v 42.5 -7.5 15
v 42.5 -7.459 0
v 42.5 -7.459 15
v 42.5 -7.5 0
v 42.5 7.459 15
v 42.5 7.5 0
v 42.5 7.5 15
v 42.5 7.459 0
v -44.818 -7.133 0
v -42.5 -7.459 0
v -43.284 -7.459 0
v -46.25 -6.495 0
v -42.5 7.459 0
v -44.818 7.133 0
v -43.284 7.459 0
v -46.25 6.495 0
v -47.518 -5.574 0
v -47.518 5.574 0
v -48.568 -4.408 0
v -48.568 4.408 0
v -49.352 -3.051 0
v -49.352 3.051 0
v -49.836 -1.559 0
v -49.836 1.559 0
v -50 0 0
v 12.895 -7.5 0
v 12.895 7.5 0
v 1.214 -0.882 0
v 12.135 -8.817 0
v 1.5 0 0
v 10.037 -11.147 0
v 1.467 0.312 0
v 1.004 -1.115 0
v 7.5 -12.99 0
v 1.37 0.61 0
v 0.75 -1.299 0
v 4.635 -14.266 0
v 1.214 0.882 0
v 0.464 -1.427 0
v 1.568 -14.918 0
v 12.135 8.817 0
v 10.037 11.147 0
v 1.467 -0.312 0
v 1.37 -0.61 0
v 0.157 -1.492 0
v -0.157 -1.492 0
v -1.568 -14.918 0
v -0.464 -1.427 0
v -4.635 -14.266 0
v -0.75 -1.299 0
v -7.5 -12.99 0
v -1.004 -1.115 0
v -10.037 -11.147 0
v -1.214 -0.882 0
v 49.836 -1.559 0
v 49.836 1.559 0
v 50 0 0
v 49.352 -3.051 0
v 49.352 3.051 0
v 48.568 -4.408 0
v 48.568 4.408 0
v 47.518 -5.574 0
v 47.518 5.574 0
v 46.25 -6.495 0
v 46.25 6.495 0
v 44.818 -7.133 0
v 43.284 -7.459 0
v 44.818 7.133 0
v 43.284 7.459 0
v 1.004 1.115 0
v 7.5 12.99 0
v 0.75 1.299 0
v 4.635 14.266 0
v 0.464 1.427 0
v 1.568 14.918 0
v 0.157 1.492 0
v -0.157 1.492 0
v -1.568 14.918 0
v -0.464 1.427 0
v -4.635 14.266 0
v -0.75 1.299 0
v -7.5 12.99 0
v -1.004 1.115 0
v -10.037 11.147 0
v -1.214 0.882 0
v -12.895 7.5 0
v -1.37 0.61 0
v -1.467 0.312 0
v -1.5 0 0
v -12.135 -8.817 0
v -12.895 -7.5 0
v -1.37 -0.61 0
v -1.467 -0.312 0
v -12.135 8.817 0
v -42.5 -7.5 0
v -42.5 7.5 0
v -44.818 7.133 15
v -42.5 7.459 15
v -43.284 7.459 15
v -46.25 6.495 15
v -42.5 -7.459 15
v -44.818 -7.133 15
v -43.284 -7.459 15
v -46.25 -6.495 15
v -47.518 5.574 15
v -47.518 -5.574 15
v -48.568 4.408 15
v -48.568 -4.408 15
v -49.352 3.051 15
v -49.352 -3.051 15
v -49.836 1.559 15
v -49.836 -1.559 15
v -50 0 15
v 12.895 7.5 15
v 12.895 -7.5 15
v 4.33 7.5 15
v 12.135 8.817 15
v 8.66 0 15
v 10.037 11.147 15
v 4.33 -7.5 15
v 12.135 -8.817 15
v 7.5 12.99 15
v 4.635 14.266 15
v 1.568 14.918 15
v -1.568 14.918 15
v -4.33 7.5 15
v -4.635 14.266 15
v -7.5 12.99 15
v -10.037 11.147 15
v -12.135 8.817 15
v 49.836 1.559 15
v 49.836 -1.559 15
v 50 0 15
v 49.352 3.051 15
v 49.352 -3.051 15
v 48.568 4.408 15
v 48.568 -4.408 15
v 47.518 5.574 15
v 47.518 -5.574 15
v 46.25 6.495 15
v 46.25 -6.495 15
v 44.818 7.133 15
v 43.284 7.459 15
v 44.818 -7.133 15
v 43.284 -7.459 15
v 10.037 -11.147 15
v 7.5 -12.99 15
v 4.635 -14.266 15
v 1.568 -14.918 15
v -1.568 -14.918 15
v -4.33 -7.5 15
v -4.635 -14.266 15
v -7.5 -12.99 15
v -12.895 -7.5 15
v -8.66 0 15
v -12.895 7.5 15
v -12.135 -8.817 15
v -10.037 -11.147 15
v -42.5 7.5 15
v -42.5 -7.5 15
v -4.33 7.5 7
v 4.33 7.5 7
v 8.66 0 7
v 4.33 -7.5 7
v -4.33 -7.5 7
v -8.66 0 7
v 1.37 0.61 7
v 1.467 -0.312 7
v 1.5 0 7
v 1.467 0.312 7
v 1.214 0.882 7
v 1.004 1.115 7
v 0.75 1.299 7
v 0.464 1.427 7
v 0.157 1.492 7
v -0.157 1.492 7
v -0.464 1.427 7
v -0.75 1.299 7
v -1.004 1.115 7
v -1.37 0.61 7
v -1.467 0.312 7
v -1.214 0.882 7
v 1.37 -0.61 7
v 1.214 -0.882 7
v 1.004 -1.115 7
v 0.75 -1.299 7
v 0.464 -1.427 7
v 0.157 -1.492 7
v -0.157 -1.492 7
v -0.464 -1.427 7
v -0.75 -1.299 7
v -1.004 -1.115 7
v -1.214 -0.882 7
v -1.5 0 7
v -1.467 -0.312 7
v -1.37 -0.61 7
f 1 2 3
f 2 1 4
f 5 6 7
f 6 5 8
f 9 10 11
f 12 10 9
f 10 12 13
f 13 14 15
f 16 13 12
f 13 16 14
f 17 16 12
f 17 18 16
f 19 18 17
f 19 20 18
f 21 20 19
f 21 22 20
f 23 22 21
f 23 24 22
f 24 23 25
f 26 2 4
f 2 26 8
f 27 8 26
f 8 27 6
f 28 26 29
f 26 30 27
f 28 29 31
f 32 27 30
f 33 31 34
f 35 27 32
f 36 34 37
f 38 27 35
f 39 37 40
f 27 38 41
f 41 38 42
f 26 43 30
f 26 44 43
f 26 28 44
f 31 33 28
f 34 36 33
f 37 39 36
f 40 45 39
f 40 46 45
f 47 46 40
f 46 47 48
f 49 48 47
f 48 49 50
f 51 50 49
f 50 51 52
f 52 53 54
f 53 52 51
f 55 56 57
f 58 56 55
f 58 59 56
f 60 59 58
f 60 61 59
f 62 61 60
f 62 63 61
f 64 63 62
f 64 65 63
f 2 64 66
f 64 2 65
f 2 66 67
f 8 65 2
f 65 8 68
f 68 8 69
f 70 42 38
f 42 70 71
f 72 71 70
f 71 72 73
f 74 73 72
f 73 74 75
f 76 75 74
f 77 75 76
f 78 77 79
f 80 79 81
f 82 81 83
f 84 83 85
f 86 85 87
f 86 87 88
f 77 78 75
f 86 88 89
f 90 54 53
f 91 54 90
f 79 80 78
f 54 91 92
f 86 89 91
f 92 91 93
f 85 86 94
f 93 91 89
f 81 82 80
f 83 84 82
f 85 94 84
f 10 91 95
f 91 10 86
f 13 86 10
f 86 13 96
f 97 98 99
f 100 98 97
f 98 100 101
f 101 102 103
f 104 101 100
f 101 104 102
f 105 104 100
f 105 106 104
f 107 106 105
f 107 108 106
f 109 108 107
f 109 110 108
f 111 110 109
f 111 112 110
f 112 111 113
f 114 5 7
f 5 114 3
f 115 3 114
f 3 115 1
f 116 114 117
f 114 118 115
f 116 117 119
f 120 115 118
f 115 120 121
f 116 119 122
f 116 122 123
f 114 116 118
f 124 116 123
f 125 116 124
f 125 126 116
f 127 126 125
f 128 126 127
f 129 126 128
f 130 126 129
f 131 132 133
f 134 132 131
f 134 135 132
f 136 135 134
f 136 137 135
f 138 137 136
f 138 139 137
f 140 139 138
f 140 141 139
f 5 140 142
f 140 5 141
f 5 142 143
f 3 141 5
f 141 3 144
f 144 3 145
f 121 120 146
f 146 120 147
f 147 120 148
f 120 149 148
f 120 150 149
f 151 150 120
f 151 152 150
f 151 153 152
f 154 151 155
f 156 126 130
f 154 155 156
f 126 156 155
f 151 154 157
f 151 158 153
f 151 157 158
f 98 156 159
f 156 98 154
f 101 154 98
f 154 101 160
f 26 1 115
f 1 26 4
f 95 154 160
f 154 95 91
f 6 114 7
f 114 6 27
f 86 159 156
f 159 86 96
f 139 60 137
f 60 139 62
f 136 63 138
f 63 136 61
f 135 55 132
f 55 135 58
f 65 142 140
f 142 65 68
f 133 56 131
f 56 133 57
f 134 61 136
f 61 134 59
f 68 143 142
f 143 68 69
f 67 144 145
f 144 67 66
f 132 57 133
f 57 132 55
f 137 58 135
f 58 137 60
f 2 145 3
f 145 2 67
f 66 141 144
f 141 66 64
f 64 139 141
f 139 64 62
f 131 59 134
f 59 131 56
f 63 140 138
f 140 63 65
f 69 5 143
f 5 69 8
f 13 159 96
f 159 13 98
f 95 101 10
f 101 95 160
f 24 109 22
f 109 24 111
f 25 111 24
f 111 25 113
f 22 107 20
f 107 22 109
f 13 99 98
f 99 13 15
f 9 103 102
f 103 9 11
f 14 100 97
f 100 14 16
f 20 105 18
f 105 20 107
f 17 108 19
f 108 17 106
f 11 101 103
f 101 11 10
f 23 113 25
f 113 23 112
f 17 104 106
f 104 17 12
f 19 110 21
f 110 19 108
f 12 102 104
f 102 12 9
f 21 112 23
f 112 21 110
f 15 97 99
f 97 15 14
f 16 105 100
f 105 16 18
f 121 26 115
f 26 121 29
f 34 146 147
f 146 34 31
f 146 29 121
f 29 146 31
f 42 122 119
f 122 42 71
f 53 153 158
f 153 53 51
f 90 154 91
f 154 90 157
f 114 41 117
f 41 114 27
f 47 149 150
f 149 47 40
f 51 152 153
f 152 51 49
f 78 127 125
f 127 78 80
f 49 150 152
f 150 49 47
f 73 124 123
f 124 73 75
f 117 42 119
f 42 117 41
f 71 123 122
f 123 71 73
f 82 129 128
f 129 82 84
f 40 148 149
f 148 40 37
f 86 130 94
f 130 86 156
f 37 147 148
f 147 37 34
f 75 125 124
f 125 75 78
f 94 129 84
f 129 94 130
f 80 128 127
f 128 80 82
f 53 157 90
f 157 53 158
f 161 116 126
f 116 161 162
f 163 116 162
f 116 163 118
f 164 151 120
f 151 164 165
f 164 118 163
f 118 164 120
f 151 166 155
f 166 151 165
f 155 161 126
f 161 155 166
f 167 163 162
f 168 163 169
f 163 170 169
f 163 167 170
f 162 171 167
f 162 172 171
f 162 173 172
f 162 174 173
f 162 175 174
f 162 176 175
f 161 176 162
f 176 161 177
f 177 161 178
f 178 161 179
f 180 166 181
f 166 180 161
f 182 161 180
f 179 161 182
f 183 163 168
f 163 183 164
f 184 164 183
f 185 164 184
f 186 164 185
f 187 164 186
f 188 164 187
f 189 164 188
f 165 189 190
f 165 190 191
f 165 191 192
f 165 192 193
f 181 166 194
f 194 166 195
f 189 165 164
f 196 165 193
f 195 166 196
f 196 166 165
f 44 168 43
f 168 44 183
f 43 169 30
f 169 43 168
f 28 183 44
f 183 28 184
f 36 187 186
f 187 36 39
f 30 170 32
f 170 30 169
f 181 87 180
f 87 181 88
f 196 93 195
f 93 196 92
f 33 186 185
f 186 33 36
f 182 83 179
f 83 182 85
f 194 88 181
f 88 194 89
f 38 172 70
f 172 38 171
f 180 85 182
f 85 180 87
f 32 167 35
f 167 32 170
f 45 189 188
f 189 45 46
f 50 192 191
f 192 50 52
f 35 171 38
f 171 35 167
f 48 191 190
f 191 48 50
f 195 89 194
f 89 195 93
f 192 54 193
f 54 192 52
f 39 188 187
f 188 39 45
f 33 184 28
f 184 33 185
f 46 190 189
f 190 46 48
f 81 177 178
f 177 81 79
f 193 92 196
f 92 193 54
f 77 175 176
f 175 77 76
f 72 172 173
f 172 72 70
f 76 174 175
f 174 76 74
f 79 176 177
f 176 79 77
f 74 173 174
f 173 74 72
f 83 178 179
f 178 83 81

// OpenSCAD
/* [Global] */

thickness = 15;
armLength = 50;
armWidth = 15;
headDia = 30;
numArms = 2; // [1:8]
holeDia=3;
hexBoltSize=15;
hexHoleDepth = 8;

translate([0,0,thickness])
	rotate([180,0,0])
		difference(){
			union(){
				head();
				arm();
			}
			holes();
		}

module arm() {
	for (i=[0:numArms-1]){
		rotate([0,0,i*360/numArms]){
			translate([0,-armWidth/2,0])
				cube([armLength-armWidth/2,armWidth,thickness]);
			translate([armLength-armWidth/2,0,0])
				cylinder($fn = 30,r=armWidth/2,h=thickness);
		}
	}
}

module head() {
		cylinder(r=headDia/2, h=thickness);
}

module holes () {
	union(){
		translate([0,0,-hexHoleDepth])
			cylinder($fn = 6,r =hexBoltSize*0.5773502, h = hexHoleDepth*2);
		cylinder($fn = 30, r=holeDia/2,h=thickness*2);
	}
}
